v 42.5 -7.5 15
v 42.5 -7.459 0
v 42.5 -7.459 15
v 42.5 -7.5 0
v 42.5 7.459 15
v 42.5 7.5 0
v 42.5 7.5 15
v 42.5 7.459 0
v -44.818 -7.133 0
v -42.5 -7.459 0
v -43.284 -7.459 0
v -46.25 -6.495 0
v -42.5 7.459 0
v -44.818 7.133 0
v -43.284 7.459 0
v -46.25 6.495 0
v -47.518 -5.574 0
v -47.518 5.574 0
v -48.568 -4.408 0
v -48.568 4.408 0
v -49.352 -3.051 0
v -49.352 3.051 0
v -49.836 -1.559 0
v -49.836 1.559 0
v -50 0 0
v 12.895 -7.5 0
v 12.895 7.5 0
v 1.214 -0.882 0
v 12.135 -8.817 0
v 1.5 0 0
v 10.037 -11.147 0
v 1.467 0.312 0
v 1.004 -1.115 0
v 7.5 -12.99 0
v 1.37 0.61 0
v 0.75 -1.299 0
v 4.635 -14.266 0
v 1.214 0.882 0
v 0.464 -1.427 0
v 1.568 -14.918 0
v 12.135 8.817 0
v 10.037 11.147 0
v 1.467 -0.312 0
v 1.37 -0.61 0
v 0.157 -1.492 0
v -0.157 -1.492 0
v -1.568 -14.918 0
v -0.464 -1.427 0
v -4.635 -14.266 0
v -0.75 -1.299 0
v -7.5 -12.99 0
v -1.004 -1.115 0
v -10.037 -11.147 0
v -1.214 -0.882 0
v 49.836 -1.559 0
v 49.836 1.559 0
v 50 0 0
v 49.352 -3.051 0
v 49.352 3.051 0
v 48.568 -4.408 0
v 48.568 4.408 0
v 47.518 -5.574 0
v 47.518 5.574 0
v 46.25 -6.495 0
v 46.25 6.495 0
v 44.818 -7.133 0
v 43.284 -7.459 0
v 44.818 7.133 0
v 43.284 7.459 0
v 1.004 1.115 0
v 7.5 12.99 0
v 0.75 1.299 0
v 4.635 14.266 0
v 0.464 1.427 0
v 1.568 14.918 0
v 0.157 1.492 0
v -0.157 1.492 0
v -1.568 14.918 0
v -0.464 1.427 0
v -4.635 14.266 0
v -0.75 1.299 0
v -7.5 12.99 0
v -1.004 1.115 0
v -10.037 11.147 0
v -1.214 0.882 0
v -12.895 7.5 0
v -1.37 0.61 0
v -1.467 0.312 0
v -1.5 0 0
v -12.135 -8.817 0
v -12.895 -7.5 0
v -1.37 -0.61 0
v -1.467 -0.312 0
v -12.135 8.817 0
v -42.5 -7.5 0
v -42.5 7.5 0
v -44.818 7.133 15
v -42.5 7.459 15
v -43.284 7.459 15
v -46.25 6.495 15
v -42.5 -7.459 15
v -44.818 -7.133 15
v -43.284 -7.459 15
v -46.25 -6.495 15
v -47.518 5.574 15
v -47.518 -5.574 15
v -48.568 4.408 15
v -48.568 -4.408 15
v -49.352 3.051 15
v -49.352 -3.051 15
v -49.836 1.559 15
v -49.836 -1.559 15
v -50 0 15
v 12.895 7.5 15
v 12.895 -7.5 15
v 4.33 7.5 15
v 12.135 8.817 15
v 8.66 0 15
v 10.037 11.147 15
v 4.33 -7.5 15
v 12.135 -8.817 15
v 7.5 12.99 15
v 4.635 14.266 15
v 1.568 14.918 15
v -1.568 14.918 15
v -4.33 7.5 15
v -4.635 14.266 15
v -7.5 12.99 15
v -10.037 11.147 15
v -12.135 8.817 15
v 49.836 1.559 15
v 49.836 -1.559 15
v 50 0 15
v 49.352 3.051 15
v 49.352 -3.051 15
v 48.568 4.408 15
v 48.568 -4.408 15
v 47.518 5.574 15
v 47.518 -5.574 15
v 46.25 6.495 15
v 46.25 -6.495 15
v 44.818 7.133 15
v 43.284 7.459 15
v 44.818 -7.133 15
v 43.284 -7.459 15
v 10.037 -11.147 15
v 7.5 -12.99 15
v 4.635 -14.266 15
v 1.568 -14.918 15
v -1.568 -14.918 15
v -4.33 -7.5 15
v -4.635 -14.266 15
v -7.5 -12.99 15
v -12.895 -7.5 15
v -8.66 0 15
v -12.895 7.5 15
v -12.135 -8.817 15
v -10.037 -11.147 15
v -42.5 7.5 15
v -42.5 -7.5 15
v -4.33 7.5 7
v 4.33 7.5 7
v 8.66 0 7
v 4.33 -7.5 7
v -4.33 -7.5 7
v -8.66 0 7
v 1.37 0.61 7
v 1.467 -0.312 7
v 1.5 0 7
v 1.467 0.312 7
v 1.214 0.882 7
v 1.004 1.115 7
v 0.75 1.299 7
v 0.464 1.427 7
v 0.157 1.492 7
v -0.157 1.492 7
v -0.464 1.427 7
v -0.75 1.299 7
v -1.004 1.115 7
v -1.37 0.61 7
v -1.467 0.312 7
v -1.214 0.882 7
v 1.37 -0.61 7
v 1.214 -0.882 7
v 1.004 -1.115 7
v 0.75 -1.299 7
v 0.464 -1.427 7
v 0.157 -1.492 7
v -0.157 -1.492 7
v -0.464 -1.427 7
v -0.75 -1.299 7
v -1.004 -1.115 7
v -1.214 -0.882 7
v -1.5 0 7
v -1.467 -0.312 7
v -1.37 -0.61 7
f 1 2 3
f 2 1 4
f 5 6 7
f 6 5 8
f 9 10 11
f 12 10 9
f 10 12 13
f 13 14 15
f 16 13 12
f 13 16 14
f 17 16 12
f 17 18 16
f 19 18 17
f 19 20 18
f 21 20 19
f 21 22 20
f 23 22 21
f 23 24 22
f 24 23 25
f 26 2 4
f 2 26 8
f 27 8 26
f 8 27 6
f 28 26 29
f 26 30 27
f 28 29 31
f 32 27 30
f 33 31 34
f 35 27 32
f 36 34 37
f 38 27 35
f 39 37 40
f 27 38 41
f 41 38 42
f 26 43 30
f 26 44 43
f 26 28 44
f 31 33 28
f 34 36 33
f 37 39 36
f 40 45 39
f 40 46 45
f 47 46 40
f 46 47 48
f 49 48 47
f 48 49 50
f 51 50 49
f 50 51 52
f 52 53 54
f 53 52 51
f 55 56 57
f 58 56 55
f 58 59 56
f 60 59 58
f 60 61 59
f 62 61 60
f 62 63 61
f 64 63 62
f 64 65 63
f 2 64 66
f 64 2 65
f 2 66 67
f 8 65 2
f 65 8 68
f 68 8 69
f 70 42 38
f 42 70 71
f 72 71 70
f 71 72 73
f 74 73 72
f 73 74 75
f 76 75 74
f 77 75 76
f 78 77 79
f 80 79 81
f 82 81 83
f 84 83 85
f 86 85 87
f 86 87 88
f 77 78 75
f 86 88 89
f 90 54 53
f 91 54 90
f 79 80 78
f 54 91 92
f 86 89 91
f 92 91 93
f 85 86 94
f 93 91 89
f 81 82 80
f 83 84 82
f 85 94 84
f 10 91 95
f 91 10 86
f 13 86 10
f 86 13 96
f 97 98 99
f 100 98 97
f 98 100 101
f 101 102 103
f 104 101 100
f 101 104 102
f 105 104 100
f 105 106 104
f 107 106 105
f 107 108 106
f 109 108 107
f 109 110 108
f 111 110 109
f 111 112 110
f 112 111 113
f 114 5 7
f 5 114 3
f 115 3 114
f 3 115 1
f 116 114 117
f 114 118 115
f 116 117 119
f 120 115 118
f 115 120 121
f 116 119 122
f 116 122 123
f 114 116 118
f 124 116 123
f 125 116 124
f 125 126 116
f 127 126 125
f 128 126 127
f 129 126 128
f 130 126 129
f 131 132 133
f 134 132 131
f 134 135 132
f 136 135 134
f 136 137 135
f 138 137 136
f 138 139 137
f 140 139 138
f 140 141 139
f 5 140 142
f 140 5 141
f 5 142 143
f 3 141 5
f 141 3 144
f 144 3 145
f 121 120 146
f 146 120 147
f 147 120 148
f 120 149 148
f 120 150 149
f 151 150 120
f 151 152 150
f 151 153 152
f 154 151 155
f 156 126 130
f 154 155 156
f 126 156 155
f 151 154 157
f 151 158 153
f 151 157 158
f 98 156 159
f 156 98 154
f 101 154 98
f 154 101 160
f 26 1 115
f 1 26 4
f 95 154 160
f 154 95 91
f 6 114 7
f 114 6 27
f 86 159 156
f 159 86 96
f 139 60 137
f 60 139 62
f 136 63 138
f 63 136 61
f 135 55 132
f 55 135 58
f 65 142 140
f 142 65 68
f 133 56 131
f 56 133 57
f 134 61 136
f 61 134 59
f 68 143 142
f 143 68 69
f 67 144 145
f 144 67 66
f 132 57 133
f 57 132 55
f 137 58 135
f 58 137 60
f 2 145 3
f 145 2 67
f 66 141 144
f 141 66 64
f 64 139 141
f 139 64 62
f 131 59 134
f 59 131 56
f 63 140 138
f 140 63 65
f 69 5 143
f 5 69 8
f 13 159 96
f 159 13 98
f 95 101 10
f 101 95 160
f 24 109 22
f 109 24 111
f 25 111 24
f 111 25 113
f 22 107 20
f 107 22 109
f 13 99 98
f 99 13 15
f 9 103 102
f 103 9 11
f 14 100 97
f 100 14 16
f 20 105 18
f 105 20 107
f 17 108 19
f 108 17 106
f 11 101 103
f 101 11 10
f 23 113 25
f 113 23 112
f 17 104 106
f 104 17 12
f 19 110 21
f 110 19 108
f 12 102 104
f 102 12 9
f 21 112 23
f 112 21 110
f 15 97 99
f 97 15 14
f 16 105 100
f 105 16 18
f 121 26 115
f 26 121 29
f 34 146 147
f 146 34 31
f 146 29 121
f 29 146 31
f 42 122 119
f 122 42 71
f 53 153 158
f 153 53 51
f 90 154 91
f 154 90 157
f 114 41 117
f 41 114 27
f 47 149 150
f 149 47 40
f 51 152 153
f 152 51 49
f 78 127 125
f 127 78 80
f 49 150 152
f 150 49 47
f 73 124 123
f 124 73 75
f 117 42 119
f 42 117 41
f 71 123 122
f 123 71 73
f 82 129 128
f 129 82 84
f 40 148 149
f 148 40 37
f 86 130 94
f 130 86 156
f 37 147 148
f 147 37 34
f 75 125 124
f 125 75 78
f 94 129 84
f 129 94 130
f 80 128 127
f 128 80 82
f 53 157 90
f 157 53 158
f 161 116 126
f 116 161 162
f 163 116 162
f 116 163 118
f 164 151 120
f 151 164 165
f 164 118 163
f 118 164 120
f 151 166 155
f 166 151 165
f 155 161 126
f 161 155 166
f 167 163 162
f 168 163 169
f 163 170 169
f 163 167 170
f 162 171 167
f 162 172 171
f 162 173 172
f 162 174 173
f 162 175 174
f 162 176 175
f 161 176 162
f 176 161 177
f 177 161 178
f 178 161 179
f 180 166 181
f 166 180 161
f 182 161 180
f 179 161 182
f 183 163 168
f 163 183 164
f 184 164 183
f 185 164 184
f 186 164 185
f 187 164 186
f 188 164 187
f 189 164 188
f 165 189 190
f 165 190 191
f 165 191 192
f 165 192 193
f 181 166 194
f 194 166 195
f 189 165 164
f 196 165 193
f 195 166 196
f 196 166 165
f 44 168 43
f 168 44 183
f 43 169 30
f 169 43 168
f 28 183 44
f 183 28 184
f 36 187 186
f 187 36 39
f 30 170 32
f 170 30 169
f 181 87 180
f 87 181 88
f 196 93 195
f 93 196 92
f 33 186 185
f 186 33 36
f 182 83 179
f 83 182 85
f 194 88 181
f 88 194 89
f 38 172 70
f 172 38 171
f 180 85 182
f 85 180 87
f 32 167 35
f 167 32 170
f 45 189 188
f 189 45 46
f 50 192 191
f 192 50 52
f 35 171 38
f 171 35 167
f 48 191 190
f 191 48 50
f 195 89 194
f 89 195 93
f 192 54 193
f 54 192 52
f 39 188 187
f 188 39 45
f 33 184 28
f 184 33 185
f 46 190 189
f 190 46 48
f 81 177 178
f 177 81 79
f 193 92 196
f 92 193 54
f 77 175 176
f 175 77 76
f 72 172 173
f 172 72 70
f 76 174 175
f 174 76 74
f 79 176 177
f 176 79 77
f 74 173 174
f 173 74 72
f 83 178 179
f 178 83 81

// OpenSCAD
/* [Global] */

thickness = 15;
armLength = 50;
armWidth = 15;
headDia = 30;
numArms = 2; // [1:8]
holeDia=3;
hexBoltSize=15;
hexHoleDepth = 8;

translate([0,0,thickness])
	rotate([180,0,0])
		difference(){
			union(){
				head();
				arm();
			}
			holes();
		}

module arm() {
	for (i=[0:numArms-1]){
		rotate([0,0,i*360/numArms]){
			translate([0,-armWidth/2,0])
				cube([armLength-armWidth/2,armWidth,thickness]);
			translate([armLength-armWidth/2,0,0])
				cylinder($fn = 30,r=armWidth/2,h=thickness);
		}
	}
}

module head() {
		cylinder(r=headDia/2, h=thickness);
}

module holes () {
	union(){
		translate([0,0,-hexHoleDepth])
			cylinder($fn = 6,r =hexBoltSize*0.5773502, h = hexHoleDepth*2);
		cylinder($fn = 30, r=holeDia/2,h=thickness*2);
	}
}
